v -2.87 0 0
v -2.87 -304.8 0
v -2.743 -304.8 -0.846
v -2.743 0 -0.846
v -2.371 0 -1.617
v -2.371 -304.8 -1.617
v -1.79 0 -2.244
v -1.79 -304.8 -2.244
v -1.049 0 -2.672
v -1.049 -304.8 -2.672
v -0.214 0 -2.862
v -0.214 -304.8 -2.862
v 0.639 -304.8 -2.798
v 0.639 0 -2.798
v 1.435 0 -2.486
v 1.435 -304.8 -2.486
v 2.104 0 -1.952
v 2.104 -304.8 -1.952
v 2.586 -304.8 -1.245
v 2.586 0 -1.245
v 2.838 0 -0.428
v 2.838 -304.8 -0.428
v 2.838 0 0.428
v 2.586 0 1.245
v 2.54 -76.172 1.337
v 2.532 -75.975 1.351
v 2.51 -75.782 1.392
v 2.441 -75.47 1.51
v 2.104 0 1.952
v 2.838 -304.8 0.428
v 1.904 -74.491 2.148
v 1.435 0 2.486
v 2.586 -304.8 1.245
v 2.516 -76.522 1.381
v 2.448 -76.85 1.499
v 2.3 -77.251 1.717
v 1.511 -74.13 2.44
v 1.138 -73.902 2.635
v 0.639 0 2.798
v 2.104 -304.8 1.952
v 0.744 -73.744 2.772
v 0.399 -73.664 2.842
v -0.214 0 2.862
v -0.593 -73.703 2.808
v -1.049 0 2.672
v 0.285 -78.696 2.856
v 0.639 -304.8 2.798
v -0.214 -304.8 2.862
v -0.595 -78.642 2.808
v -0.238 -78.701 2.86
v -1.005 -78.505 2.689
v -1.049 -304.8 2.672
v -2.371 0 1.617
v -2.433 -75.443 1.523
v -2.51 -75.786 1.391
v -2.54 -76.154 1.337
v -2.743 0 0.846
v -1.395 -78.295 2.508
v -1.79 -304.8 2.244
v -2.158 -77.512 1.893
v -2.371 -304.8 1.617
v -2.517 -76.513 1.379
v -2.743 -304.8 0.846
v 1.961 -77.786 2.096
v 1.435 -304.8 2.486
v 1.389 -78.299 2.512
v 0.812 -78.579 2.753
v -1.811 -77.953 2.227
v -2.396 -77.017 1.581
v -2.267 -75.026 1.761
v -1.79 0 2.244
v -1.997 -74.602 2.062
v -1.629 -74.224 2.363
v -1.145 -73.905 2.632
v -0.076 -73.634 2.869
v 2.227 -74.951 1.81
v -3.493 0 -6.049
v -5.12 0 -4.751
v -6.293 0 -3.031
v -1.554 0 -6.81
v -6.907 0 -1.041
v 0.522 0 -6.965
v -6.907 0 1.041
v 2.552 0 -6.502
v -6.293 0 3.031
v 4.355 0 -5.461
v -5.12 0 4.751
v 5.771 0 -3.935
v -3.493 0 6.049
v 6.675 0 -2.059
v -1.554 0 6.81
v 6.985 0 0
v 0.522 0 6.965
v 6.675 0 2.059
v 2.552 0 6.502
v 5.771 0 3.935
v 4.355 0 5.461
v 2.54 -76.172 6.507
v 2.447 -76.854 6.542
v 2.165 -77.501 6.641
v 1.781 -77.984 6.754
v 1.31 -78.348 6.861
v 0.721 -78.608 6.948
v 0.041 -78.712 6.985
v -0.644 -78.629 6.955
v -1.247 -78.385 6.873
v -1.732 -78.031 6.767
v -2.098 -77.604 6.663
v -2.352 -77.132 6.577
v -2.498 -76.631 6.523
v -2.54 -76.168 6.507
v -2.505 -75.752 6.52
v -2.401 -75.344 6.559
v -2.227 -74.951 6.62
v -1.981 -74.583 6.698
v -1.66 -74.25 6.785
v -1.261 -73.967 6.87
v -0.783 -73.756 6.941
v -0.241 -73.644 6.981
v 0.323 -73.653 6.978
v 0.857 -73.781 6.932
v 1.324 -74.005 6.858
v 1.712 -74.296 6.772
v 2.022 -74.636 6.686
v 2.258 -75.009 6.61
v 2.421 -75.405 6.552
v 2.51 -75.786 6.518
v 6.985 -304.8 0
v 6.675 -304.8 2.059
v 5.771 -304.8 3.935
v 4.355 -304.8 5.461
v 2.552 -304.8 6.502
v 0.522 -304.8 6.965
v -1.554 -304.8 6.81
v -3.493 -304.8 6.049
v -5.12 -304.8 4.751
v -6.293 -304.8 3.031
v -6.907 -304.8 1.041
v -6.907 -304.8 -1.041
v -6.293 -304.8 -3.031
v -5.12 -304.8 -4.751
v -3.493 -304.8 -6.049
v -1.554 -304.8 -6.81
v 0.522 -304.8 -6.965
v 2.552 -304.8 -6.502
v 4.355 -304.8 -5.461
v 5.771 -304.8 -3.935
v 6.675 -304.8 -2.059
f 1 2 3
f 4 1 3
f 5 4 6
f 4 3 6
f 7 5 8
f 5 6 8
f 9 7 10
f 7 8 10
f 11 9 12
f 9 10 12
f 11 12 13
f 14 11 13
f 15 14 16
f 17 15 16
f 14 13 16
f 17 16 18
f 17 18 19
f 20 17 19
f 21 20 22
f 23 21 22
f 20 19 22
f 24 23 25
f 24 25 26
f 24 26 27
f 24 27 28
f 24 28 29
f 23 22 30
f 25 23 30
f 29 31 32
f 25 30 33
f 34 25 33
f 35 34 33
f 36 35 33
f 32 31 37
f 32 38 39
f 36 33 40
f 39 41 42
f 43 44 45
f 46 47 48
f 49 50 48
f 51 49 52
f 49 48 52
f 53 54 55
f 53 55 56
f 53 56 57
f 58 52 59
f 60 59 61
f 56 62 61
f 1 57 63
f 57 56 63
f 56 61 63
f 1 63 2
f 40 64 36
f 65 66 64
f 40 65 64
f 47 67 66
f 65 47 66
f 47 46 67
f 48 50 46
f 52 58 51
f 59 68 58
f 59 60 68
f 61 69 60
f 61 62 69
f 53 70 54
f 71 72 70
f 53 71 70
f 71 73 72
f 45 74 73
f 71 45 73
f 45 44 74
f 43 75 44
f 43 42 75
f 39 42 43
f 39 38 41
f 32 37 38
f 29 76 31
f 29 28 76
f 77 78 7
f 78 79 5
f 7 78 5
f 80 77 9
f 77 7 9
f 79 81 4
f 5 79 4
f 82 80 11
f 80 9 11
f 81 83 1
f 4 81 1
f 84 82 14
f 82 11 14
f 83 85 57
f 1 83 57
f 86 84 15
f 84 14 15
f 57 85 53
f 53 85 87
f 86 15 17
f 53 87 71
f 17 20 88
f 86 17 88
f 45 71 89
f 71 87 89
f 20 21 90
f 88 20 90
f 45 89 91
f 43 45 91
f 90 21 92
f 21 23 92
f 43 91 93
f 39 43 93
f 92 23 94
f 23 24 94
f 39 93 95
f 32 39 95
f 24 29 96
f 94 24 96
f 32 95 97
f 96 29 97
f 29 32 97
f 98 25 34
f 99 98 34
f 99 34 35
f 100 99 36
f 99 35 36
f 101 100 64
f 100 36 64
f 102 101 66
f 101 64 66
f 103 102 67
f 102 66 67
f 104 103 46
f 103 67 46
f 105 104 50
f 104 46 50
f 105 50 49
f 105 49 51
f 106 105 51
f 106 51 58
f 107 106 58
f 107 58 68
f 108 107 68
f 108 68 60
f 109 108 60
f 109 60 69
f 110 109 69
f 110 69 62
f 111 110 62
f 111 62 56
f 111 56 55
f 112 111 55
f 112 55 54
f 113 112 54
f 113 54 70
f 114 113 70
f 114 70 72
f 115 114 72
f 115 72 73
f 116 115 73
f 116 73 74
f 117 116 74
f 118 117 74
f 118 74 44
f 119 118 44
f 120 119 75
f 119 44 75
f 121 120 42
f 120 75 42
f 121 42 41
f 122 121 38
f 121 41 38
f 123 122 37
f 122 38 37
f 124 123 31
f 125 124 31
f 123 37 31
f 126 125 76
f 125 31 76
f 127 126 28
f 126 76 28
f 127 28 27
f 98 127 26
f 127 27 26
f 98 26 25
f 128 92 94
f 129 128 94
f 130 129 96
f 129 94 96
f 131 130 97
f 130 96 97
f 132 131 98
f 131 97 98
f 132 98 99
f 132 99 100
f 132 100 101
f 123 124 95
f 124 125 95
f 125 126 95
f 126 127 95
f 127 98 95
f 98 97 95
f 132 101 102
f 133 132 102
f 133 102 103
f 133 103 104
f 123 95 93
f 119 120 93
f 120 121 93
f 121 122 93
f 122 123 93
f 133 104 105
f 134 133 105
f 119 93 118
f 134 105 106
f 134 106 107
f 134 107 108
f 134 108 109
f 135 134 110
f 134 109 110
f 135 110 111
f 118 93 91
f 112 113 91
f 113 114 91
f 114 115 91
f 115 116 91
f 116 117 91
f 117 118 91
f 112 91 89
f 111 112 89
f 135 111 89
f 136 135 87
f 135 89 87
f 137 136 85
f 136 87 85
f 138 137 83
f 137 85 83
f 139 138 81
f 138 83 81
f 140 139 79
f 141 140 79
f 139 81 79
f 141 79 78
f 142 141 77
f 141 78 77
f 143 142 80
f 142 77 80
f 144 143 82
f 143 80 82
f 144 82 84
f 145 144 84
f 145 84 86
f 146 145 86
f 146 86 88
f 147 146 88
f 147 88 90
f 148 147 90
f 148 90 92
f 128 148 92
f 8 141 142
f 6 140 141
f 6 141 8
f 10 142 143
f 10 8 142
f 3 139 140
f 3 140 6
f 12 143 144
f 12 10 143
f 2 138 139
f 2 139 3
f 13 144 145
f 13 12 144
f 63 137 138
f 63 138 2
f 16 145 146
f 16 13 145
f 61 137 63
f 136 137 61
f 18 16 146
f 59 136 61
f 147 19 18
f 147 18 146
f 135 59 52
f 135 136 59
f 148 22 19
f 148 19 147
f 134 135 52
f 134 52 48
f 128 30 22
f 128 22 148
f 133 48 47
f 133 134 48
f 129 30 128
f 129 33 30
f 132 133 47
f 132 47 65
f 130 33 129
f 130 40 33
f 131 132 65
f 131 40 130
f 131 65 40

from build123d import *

# Parameters (mm, degrees)
F0_R     = 6.985
F1_DEPTH = 304.8
F3_D     = 5.7404
F3_DEPTH = 304.8
F3_TIP   = 1.7245901487
F5_D     = 5.08
F5_DEPTH = 25.4
F5_TIP   = 1.5261859723


with BuildPart() as f1:
    # F0 (on Front) → F1 (new body)
    with BuildSketch(Plane.XZ):
        Circle(F0_R)
    extrude(amount=F1_DEPTH)

    # F3
    with Locations(Plane(origin=(0, 0, 0), x_dir=(1, 0, 0), z_dir=(0, 1, 0))):
        with Locations((0, 0)):
            Hole(F3_D / 2, depth=F3_DEPTH)
            with Locations((0, 0, -(F3_DEPTH + F3_TIP / 2))):  # 118° drill point
                Cone(0, F3_D / 2, F3_TIP, mode=Mode.SUBTRACT)

    # F5 (one way)
    with BuildSketch(Plane(origin=(0, 0, 0), x_dir=(1, 0, 0), z_dir=(0, 0, -1))):
        with Locations((0, 76.1724114418)):
            Circle(F5_D / 2)
    extrude(amount=-F5_DEPTH, mode=Mode.SUBTRACT)
    with Locations(Plane(origin=(0, 0, 0), x_dir=(1, 0, 0), z_dir=(0, 0, -1))):
        with Locations((0, 76.1724114418)):
            with Locations((0, 0, -(F5_DEPTH + F5_TIP / 2))):  # 118° drill point
                Cone(0, F5_D / 2, F5_TIP, mode=Mode.SUBTRACT)


solid = f1.part
